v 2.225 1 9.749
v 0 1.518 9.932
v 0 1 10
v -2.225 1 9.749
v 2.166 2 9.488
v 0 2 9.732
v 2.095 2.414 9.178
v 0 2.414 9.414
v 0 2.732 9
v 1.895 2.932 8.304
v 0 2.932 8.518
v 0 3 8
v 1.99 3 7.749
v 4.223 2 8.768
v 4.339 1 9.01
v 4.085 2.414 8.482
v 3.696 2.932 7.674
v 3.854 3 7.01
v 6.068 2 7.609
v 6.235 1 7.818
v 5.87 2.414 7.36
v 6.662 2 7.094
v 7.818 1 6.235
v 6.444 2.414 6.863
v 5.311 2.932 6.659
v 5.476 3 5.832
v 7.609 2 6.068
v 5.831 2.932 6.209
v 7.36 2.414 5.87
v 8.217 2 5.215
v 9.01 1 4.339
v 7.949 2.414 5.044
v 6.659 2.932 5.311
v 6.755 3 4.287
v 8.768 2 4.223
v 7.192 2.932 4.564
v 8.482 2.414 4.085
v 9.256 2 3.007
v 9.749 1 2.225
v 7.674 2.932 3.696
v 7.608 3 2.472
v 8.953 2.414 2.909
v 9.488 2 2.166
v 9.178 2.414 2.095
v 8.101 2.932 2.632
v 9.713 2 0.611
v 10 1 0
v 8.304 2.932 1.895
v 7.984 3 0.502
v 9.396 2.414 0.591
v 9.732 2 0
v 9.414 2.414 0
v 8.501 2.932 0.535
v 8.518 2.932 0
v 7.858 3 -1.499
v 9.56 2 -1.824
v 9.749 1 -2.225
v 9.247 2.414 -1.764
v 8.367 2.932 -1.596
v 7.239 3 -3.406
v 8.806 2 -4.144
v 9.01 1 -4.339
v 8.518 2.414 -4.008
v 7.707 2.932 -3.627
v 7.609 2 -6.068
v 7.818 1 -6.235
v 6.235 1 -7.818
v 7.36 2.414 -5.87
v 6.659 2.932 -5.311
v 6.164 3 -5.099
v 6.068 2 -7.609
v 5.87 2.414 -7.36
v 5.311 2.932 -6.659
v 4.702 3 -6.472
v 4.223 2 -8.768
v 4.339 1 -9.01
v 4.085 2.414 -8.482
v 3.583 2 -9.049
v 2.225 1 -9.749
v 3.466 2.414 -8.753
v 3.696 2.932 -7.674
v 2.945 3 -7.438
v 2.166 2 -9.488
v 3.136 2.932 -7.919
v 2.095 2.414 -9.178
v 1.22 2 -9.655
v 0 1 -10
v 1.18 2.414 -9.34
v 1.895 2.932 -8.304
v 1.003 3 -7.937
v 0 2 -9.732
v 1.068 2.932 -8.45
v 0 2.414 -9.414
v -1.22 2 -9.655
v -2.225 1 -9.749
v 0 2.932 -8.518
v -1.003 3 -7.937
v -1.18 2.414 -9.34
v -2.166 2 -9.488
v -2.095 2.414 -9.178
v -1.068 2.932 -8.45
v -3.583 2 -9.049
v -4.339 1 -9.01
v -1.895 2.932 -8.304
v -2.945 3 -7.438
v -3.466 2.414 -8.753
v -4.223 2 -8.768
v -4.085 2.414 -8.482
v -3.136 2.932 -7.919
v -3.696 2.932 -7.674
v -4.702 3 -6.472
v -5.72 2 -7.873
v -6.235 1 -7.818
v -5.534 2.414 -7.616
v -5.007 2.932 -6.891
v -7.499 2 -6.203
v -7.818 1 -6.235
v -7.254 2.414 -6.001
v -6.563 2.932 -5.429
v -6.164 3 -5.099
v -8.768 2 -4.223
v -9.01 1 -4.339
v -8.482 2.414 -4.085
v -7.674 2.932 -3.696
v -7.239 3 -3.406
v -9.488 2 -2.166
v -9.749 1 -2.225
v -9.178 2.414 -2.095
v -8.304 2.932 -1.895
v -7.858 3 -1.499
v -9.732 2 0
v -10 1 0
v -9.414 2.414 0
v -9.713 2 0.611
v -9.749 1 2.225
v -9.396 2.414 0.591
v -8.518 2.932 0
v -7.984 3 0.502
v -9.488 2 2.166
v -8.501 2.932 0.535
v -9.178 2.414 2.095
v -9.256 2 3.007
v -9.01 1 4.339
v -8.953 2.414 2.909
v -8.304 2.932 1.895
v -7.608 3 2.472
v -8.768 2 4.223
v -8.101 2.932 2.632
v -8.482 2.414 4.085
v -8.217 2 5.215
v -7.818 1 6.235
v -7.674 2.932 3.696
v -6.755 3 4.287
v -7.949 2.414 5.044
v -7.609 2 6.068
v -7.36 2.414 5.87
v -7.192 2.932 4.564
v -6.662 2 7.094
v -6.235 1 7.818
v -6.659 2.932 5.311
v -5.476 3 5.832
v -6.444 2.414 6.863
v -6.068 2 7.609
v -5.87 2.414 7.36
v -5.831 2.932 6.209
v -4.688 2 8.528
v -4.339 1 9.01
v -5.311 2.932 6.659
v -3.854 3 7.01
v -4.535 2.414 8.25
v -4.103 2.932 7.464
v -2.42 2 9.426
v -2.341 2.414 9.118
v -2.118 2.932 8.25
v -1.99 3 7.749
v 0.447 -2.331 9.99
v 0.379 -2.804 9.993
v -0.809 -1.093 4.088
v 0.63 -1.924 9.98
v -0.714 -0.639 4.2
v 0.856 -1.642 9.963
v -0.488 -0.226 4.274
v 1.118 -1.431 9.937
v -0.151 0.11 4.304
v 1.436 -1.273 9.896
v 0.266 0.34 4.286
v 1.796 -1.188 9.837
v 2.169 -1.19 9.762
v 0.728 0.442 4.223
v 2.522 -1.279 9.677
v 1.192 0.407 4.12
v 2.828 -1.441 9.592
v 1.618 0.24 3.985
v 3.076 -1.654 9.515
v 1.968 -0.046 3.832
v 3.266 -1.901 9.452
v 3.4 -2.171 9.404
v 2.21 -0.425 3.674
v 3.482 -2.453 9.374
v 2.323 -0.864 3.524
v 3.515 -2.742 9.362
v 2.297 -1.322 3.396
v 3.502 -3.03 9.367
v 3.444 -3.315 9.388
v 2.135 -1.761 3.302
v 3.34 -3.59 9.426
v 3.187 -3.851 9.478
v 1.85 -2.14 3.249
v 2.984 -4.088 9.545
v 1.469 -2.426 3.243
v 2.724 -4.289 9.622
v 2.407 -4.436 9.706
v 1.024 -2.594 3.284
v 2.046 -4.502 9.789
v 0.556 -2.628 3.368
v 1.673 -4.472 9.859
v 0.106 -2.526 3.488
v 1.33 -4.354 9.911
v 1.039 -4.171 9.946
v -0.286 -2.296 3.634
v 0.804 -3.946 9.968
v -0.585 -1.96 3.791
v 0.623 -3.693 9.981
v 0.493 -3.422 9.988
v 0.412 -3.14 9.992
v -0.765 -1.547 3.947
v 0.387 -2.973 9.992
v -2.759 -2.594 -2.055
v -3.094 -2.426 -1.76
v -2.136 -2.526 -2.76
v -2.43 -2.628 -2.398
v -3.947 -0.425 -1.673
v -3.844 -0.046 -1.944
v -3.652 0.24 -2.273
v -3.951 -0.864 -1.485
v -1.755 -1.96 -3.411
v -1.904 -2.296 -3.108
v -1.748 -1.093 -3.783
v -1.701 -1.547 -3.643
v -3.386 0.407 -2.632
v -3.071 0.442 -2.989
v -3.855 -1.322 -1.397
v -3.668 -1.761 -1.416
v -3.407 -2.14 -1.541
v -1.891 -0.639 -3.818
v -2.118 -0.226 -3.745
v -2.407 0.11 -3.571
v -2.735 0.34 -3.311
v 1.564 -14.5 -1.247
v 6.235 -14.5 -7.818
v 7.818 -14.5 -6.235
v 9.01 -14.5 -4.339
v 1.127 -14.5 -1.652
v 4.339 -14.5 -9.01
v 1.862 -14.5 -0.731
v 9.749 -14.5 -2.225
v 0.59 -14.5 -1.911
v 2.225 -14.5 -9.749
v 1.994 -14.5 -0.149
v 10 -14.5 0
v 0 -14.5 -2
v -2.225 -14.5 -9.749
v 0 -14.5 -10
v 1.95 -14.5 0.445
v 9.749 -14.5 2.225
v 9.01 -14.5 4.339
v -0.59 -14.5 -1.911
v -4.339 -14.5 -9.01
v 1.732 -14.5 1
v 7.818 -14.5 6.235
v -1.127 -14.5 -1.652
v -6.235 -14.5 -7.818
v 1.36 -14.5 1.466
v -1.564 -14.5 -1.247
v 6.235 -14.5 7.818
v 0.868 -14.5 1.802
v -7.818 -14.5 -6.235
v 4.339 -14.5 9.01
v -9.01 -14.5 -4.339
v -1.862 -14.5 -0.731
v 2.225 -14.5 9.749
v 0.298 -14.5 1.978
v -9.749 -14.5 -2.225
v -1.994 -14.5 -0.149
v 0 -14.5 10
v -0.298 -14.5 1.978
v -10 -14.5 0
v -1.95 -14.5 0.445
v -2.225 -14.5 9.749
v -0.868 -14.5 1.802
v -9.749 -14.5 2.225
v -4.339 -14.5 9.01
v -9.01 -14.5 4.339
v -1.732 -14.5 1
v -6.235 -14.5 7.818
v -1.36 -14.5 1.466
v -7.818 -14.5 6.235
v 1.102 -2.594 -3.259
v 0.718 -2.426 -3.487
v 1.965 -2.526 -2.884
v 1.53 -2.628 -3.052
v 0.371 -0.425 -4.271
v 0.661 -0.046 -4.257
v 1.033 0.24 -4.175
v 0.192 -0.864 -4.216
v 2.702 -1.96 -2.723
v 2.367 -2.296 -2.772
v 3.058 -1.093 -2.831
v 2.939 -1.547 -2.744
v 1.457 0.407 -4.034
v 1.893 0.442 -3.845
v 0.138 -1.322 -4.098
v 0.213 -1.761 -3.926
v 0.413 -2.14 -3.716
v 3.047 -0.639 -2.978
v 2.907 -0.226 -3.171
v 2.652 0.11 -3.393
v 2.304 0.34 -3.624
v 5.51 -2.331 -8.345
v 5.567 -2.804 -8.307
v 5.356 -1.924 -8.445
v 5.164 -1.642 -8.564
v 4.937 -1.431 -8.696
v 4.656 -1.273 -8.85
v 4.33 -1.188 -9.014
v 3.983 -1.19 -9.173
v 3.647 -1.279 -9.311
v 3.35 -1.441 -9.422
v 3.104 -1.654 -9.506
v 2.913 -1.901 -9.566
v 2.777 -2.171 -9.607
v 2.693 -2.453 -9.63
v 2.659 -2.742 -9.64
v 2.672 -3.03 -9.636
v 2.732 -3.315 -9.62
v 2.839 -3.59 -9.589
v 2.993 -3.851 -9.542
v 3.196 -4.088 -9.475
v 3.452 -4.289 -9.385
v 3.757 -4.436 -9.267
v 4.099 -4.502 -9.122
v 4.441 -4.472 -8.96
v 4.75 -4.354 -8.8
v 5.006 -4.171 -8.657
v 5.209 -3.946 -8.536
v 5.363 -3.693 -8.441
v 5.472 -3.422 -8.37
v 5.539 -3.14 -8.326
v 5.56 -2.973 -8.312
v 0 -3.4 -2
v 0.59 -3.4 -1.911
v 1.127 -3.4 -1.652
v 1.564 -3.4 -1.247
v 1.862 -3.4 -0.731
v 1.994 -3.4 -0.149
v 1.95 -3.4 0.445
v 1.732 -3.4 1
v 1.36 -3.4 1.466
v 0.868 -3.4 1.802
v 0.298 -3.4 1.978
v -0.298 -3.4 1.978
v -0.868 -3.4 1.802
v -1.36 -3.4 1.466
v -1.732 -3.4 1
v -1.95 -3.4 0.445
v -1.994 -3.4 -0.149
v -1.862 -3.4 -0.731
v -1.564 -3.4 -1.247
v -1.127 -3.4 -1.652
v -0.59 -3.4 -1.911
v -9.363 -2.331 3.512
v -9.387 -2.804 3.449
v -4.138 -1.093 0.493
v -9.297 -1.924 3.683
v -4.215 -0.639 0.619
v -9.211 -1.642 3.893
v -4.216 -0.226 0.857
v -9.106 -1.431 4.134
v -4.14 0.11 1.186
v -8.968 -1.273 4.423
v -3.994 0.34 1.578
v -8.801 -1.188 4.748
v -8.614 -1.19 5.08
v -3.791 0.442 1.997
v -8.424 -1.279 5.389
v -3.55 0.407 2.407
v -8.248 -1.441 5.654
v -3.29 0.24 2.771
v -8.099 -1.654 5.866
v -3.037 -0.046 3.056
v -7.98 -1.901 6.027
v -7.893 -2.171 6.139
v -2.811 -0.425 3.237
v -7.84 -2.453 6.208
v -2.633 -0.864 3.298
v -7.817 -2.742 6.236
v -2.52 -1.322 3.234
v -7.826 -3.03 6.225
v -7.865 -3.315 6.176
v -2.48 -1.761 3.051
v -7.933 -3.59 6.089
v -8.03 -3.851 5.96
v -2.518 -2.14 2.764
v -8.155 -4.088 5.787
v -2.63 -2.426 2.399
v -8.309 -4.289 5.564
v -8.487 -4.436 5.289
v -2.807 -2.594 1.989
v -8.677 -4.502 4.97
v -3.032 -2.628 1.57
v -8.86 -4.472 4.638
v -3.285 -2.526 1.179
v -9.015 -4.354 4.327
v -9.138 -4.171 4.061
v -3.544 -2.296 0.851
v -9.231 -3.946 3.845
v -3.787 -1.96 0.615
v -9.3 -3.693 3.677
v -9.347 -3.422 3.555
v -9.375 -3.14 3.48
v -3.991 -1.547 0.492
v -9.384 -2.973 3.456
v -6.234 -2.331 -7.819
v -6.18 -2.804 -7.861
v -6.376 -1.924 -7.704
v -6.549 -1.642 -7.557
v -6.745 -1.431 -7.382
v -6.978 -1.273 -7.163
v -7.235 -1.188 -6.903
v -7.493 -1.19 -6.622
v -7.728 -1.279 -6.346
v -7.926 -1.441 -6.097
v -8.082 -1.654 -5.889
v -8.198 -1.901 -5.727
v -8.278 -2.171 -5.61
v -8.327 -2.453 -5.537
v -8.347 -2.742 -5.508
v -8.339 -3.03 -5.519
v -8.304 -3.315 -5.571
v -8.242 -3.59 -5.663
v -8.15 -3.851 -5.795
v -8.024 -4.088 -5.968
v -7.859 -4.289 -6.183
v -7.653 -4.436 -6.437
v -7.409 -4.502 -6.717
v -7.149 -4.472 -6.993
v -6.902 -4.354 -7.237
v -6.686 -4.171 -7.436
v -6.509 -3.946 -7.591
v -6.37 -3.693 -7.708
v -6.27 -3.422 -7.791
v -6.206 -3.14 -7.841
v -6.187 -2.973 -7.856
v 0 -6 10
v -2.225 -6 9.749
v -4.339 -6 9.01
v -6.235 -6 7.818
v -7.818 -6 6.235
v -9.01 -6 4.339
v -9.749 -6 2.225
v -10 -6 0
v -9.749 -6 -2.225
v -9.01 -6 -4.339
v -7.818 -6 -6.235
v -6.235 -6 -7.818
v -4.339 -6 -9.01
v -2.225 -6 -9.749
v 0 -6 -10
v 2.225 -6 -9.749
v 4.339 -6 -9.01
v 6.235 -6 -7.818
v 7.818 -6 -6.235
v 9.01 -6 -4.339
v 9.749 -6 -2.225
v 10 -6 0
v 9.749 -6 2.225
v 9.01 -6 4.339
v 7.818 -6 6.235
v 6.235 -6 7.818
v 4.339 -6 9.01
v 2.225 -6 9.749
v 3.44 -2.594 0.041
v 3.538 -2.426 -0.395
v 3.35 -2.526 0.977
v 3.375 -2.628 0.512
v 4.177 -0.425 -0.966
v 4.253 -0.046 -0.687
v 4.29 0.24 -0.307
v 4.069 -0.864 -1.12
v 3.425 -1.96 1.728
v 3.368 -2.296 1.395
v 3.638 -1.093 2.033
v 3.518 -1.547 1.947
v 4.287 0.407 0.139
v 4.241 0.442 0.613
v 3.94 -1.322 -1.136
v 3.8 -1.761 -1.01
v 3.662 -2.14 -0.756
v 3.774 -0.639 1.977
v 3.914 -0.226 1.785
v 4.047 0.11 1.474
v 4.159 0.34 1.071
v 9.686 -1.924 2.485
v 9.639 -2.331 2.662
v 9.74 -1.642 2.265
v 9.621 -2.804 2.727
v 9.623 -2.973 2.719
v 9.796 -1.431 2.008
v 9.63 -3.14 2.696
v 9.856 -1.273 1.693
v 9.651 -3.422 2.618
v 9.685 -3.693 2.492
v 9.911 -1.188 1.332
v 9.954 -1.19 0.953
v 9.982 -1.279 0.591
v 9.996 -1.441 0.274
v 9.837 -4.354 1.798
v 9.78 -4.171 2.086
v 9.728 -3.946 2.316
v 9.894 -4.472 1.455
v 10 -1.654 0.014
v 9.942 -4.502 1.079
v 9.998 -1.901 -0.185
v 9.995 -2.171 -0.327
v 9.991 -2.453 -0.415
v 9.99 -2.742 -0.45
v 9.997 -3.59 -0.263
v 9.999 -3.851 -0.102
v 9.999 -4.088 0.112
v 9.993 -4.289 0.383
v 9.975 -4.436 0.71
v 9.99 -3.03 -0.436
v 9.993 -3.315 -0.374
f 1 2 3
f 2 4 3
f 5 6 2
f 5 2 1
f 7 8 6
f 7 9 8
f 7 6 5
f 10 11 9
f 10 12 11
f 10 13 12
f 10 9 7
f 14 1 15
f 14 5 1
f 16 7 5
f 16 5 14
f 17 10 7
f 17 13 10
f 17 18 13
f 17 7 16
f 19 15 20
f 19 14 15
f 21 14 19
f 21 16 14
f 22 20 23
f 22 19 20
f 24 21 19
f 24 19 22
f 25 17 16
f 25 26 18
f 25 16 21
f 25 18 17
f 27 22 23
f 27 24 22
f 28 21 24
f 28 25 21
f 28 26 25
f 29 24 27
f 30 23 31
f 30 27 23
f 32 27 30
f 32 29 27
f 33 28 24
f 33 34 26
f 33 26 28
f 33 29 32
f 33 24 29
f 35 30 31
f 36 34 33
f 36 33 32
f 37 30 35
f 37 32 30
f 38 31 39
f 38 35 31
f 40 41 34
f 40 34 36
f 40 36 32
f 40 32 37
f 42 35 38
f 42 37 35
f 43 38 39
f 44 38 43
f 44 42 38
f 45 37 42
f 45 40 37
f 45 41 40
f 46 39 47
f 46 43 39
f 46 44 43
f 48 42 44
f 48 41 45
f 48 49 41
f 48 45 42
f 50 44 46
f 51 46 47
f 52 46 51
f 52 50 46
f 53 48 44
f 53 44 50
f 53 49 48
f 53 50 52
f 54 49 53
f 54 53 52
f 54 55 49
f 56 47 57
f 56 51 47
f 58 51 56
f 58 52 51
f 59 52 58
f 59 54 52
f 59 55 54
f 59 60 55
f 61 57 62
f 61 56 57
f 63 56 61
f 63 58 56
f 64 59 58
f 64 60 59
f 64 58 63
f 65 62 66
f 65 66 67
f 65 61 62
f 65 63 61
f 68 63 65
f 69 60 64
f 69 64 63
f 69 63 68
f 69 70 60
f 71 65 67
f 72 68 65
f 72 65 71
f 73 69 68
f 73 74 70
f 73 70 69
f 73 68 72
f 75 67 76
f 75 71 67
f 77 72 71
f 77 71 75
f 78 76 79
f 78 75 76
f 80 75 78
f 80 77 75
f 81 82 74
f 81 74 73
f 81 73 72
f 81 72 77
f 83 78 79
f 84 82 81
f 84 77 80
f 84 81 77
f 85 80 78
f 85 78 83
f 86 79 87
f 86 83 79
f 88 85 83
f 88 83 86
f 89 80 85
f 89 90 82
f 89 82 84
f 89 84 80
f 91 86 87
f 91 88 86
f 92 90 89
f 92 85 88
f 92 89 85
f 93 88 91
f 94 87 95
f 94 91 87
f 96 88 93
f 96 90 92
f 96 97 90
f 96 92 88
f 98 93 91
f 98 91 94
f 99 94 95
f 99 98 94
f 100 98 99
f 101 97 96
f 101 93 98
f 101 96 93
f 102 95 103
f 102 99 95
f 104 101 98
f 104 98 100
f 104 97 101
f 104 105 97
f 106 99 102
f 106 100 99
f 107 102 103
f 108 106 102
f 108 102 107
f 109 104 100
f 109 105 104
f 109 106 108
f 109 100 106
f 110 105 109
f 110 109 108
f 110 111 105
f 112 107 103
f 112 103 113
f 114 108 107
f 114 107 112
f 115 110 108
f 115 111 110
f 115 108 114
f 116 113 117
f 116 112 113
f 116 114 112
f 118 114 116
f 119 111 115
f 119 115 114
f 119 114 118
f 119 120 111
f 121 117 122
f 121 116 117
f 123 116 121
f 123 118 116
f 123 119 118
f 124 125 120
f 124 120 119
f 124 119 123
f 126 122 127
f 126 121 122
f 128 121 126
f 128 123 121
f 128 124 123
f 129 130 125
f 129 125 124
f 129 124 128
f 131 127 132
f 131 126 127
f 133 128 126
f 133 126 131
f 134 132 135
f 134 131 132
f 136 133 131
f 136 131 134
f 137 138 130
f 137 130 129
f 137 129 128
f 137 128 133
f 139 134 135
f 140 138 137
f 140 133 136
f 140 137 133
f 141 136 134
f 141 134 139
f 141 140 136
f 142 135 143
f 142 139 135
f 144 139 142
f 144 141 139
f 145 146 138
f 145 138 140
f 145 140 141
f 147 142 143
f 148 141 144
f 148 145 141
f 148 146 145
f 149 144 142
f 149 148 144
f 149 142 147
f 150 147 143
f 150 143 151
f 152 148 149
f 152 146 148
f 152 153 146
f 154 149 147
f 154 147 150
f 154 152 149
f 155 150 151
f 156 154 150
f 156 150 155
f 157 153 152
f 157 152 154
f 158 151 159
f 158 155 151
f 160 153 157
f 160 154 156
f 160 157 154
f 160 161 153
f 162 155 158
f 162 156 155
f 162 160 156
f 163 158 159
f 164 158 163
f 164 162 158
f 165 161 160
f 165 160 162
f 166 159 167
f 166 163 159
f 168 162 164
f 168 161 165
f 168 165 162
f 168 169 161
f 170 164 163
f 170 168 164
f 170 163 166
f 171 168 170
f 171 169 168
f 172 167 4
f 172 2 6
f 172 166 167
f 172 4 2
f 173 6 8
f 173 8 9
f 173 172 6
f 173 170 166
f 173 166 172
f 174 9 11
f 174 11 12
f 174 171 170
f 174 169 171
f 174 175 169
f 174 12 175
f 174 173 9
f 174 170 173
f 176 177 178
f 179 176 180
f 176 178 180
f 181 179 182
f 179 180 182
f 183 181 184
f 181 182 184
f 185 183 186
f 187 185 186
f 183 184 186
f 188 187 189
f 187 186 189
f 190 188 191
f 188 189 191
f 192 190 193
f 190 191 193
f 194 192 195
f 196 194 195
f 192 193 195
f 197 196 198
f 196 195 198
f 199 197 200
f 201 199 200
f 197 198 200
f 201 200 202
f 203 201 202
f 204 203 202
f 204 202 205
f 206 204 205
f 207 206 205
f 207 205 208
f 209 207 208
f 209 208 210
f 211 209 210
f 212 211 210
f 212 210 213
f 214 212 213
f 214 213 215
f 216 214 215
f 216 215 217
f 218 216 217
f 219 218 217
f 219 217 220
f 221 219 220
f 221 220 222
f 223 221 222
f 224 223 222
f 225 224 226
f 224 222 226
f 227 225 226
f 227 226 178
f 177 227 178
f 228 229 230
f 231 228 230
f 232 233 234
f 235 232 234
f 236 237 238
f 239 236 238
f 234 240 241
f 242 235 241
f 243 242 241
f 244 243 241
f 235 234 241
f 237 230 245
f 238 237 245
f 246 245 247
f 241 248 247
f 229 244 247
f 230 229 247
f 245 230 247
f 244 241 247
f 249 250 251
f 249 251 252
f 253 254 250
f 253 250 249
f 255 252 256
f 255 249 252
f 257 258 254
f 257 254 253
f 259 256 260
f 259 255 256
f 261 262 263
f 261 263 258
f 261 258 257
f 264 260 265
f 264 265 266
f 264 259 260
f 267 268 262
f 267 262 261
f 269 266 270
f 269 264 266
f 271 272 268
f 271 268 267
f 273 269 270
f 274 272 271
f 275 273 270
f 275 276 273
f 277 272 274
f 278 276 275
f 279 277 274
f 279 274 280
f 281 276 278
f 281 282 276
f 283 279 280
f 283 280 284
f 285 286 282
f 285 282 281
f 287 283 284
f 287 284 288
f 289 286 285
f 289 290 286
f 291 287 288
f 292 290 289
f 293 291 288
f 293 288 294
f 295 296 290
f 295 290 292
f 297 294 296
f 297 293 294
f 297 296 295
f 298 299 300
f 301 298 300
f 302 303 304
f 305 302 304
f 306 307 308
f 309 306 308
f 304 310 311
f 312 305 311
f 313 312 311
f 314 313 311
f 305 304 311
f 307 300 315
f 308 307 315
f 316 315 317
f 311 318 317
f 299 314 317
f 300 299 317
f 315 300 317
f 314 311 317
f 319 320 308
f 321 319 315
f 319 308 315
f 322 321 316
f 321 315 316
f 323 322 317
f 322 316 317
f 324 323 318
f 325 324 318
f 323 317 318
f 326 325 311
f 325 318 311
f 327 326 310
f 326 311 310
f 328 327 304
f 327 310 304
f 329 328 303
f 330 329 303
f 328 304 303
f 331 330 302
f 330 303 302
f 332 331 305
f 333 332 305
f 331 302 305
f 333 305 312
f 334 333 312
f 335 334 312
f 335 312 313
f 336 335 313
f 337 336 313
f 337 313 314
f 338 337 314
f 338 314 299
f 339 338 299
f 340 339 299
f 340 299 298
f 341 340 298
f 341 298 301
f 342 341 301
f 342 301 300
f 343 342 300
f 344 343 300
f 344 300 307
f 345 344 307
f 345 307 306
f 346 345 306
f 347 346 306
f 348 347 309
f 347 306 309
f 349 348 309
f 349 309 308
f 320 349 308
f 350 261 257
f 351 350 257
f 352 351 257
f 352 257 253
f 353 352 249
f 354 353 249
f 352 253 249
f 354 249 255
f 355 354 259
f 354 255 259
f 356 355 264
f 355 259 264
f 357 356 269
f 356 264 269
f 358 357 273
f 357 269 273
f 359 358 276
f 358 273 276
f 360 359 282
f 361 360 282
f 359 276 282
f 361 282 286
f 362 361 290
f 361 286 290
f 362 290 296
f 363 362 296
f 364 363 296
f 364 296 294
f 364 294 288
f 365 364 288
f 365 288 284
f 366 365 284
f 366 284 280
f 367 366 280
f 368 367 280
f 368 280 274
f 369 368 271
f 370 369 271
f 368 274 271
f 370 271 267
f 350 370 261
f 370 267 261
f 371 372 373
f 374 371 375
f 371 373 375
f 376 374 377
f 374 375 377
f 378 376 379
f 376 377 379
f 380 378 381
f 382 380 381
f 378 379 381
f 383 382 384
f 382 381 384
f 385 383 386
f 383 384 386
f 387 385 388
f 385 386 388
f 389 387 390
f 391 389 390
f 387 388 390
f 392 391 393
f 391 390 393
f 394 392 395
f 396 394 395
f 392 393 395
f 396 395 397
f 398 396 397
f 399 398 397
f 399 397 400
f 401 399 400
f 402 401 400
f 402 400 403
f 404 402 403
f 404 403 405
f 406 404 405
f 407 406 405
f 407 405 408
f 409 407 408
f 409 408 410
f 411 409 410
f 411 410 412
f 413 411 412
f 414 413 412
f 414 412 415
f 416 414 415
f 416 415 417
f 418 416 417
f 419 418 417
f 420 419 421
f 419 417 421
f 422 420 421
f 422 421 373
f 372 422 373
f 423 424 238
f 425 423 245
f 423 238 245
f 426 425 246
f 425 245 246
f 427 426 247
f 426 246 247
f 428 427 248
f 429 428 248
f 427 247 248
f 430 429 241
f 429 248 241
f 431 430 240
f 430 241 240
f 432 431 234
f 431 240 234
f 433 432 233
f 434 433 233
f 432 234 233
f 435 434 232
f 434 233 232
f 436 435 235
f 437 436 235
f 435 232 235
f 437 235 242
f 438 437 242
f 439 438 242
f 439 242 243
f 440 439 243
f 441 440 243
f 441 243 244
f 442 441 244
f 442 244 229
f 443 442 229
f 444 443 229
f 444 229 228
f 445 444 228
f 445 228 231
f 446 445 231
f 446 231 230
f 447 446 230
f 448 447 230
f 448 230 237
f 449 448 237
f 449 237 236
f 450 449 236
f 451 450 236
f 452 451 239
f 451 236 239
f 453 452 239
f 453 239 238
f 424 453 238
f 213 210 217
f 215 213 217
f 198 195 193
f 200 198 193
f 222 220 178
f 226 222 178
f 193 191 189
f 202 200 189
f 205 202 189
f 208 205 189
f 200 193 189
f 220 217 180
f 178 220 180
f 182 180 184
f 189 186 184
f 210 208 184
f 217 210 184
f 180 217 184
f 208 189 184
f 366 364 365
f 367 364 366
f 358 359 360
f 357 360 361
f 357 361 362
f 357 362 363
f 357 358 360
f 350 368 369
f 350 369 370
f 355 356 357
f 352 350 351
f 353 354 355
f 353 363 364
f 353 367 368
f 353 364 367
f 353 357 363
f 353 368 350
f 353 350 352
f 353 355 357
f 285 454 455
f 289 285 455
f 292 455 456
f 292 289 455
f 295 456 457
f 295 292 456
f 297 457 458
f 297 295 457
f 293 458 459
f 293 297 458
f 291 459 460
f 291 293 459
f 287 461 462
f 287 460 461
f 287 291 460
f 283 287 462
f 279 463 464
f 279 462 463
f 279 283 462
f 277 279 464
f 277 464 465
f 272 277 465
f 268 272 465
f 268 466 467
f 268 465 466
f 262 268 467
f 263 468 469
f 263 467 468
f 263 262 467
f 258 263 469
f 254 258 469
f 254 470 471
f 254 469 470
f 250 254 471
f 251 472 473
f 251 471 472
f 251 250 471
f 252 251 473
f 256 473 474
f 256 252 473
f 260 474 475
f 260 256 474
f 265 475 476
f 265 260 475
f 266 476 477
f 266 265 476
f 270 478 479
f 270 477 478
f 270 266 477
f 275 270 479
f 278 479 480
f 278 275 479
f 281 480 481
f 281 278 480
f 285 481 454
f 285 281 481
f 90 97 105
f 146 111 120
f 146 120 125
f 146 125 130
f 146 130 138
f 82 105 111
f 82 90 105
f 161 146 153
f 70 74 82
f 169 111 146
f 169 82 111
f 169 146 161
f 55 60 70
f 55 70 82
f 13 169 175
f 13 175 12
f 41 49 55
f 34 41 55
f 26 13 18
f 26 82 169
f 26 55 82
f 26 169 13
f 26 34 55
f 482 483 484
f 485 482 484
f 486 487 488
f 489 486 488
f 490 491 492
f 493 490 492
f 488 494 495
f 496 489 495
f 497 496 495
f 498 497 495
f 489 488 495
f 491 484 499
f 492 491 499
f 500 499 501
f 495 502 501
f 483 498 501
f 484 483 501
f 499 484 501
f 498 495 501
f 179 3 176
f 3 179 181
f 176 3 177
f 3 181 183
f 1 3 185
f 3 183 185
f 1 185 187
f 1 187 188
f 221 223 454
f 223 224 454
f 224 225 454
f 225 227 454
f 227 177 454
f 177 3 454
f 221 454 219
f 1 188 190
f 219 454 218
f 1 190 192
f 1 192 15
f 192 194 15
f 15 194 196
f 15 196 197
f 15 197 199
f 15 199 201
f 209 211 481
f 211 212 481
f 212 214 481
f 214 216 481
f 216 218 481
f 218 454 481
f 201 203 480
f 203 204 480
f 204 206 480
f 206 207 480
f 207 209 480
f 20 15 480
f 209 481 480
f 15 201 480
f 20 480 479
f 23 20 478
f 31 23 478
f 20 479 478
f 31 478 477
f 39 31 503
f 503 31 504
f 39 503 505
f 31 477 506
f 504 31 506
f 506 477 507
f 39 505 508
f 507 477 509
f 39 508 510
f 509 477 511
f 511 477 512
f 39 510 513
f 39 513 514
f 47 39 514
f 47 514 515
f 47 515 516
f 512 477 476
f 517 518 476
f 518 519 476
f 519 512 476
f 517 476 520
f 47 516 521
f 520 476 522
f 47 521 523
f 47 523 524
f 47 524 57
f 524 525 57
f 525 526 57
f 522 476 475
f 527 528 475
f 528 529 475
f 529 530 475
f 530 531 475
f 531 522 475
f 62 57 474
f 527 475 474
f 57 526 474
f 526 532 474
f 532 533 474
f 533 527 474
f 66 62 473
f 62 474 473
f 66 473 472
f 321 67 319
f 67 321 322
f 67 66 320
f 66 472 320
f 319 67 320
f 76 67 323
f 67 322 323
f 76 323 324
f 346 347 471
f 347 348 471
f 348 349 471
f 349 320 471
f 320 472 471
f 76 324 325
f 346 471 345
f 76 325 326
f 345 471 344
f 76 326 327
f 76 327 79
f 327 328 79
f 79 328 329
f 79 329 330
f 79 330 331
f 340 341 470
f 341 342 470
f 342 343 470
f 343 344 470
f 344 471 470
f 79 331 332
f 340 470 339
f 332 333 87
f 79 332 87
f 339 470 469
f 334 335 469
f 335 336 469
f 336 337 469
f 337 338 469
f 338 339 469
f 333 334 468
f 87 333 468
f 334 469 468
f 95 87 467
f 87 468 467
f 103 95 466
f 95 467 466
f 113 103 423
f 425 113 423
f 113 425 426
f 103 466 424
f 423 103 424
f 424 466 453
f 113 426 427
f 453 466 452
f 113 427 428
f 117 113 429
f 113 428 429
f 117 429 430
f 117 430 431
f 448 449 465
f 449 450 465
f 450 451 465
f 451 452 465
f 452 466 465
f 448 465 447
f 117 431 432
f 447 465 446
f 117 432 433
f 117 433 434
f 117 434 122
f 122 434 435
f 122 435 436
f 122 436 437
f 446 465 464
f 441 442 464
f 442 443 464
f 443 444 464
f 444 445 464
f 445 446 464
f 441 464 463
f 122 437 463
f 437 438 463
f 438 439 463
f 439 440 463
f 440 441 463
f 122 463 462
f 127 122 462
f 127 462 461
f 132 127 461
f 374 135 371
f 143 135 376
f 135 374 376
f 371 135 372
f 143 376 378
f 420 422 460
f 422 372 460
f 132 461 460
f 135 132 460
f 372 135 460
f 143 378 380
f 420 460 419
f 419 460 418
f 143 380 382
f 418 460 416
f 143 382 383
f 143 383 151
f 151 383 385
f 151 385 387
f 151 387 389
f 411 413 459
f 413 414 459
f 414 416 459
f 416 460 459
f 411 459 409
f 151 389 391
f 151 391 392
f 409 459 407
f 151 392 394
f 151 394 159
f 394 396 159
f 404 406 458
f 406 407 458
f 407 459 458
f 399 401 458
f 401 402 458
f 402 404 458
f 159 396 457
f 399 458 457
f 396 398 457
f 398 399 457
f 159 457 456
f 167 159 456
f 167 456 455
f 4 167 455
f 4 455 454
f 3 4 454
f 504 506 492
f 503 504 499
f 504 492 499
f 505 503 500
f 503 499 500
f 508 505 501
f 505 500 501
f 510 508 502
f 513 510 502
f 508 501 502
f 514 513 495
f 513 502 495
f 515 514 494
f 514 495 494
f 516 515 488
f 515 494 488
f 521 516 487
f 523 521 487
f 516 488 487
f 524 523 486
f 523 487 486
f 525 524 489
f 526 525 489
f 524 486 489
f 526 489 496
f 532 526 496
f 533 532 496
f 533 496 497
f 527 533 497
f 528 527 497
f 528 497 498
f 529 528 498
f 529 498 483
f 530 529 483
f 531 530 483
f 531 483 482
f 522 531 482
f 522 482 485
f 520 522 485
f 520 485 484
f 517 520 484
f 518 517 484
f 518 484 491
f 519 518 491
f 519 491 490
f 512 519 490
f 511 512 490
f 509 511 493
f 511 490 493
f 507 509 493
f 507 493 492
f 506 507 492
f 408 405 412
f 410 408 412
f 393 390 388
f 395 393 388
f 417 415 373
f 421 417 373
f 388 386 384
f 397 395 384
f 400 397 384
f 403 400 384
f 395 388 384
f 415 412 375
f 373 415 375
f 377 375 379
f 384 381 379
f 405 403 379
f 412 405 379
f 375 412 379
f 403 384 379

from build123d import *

# Parameters (mm, degrees)
BOSS_EXTRUDE1_DEPTH      = 3
BOSS_EXTRUDE1_DEPTH_BACK = 6
SKETCH1_R                = 10
SKETCH4_R                = 1.6
HOLE_DEPTH               = 19.539009706
HOLECIR_COUNT            = 5
FILLET3_R                = 2
BOSS_EXTRUDE2_START      = 8.5
SKETCH5_R                = 10
BOSS_EXTRUDE2_DEPTH      = 8.5
SKETCH6_R                = 2
CUT_EXTRUDE1_DEPTH       = 11.1


with BuildPart() as part:
    # Sketch1 → Boss-Extrude1 (new, two sides: drawn at the far end of the back side and taken through both)
    with BuildSketch(Plane(origin=(0, 0, 0), x_dir=(1, 0, 0), z_dir=(0, 1, 0)).offset(-BOSS_EXTRUDE1_DEPTH_BACK)):
        Circle(SKETCH1_R)
    extrude(amount=BOSS_EXTRUDE1_DEPTH + BOSS_EXTRUDE1_DEPTH_BACK)

    # Sketch4 → hole (cut, through all)
    with BuildSketch(Plane(origin=(-3.352872105, -1.093066116, 1.887711608), x_dir=(-0.4486862613641547, -0.14627571033740308, -0.8816371449912632), z_dir=(0.8382180262940947, 0.2732665289126682, -0.47192790187872385))):
        Circle(SKETCH4_R)
    hole = extrude(amount=-HOLE_DEPTH, mode=Mode.SUBTRACT)

    # holecir: hole ×5 about axis
    holecir_axis = Axis((0, 5.5, 0), (0, -1, 0))
    for i in range(1, HOLECIR_COUNT):
        add(hole.rotate(holecir_axis, i * 360 / HOLECIR_COUNT), mode=Mode.SUBTRACT)

    # Fillet3
    fillet3_edges = [part.edges().sort_by_distance(p)[0] for p in [
        (-10, 3, 0),
    ]]
    fillet(fillet3_edges, radius=FILLET3_R)

    # Sketch5 → Boss-Extrude2 (add)
    with BuildSketch(Plane.XZ.offset(6).offset(BOSS_EXTRUDE2_START)):
        Circle(SKETCH5_R)
    extrude(amount=-BOSS_EXTRUDE2_DEPTH)

    # Sketch6 → Cut-Extrude1 (cut)
    with BuildSketch(Plane.XZ.offset(14.5)):
        Circle(SKETCH6_R)
    extrude(amount=-CUT_EXTRUDE1_DEPTH, mode=Mode.SUBTRACT)


solid = part.part
